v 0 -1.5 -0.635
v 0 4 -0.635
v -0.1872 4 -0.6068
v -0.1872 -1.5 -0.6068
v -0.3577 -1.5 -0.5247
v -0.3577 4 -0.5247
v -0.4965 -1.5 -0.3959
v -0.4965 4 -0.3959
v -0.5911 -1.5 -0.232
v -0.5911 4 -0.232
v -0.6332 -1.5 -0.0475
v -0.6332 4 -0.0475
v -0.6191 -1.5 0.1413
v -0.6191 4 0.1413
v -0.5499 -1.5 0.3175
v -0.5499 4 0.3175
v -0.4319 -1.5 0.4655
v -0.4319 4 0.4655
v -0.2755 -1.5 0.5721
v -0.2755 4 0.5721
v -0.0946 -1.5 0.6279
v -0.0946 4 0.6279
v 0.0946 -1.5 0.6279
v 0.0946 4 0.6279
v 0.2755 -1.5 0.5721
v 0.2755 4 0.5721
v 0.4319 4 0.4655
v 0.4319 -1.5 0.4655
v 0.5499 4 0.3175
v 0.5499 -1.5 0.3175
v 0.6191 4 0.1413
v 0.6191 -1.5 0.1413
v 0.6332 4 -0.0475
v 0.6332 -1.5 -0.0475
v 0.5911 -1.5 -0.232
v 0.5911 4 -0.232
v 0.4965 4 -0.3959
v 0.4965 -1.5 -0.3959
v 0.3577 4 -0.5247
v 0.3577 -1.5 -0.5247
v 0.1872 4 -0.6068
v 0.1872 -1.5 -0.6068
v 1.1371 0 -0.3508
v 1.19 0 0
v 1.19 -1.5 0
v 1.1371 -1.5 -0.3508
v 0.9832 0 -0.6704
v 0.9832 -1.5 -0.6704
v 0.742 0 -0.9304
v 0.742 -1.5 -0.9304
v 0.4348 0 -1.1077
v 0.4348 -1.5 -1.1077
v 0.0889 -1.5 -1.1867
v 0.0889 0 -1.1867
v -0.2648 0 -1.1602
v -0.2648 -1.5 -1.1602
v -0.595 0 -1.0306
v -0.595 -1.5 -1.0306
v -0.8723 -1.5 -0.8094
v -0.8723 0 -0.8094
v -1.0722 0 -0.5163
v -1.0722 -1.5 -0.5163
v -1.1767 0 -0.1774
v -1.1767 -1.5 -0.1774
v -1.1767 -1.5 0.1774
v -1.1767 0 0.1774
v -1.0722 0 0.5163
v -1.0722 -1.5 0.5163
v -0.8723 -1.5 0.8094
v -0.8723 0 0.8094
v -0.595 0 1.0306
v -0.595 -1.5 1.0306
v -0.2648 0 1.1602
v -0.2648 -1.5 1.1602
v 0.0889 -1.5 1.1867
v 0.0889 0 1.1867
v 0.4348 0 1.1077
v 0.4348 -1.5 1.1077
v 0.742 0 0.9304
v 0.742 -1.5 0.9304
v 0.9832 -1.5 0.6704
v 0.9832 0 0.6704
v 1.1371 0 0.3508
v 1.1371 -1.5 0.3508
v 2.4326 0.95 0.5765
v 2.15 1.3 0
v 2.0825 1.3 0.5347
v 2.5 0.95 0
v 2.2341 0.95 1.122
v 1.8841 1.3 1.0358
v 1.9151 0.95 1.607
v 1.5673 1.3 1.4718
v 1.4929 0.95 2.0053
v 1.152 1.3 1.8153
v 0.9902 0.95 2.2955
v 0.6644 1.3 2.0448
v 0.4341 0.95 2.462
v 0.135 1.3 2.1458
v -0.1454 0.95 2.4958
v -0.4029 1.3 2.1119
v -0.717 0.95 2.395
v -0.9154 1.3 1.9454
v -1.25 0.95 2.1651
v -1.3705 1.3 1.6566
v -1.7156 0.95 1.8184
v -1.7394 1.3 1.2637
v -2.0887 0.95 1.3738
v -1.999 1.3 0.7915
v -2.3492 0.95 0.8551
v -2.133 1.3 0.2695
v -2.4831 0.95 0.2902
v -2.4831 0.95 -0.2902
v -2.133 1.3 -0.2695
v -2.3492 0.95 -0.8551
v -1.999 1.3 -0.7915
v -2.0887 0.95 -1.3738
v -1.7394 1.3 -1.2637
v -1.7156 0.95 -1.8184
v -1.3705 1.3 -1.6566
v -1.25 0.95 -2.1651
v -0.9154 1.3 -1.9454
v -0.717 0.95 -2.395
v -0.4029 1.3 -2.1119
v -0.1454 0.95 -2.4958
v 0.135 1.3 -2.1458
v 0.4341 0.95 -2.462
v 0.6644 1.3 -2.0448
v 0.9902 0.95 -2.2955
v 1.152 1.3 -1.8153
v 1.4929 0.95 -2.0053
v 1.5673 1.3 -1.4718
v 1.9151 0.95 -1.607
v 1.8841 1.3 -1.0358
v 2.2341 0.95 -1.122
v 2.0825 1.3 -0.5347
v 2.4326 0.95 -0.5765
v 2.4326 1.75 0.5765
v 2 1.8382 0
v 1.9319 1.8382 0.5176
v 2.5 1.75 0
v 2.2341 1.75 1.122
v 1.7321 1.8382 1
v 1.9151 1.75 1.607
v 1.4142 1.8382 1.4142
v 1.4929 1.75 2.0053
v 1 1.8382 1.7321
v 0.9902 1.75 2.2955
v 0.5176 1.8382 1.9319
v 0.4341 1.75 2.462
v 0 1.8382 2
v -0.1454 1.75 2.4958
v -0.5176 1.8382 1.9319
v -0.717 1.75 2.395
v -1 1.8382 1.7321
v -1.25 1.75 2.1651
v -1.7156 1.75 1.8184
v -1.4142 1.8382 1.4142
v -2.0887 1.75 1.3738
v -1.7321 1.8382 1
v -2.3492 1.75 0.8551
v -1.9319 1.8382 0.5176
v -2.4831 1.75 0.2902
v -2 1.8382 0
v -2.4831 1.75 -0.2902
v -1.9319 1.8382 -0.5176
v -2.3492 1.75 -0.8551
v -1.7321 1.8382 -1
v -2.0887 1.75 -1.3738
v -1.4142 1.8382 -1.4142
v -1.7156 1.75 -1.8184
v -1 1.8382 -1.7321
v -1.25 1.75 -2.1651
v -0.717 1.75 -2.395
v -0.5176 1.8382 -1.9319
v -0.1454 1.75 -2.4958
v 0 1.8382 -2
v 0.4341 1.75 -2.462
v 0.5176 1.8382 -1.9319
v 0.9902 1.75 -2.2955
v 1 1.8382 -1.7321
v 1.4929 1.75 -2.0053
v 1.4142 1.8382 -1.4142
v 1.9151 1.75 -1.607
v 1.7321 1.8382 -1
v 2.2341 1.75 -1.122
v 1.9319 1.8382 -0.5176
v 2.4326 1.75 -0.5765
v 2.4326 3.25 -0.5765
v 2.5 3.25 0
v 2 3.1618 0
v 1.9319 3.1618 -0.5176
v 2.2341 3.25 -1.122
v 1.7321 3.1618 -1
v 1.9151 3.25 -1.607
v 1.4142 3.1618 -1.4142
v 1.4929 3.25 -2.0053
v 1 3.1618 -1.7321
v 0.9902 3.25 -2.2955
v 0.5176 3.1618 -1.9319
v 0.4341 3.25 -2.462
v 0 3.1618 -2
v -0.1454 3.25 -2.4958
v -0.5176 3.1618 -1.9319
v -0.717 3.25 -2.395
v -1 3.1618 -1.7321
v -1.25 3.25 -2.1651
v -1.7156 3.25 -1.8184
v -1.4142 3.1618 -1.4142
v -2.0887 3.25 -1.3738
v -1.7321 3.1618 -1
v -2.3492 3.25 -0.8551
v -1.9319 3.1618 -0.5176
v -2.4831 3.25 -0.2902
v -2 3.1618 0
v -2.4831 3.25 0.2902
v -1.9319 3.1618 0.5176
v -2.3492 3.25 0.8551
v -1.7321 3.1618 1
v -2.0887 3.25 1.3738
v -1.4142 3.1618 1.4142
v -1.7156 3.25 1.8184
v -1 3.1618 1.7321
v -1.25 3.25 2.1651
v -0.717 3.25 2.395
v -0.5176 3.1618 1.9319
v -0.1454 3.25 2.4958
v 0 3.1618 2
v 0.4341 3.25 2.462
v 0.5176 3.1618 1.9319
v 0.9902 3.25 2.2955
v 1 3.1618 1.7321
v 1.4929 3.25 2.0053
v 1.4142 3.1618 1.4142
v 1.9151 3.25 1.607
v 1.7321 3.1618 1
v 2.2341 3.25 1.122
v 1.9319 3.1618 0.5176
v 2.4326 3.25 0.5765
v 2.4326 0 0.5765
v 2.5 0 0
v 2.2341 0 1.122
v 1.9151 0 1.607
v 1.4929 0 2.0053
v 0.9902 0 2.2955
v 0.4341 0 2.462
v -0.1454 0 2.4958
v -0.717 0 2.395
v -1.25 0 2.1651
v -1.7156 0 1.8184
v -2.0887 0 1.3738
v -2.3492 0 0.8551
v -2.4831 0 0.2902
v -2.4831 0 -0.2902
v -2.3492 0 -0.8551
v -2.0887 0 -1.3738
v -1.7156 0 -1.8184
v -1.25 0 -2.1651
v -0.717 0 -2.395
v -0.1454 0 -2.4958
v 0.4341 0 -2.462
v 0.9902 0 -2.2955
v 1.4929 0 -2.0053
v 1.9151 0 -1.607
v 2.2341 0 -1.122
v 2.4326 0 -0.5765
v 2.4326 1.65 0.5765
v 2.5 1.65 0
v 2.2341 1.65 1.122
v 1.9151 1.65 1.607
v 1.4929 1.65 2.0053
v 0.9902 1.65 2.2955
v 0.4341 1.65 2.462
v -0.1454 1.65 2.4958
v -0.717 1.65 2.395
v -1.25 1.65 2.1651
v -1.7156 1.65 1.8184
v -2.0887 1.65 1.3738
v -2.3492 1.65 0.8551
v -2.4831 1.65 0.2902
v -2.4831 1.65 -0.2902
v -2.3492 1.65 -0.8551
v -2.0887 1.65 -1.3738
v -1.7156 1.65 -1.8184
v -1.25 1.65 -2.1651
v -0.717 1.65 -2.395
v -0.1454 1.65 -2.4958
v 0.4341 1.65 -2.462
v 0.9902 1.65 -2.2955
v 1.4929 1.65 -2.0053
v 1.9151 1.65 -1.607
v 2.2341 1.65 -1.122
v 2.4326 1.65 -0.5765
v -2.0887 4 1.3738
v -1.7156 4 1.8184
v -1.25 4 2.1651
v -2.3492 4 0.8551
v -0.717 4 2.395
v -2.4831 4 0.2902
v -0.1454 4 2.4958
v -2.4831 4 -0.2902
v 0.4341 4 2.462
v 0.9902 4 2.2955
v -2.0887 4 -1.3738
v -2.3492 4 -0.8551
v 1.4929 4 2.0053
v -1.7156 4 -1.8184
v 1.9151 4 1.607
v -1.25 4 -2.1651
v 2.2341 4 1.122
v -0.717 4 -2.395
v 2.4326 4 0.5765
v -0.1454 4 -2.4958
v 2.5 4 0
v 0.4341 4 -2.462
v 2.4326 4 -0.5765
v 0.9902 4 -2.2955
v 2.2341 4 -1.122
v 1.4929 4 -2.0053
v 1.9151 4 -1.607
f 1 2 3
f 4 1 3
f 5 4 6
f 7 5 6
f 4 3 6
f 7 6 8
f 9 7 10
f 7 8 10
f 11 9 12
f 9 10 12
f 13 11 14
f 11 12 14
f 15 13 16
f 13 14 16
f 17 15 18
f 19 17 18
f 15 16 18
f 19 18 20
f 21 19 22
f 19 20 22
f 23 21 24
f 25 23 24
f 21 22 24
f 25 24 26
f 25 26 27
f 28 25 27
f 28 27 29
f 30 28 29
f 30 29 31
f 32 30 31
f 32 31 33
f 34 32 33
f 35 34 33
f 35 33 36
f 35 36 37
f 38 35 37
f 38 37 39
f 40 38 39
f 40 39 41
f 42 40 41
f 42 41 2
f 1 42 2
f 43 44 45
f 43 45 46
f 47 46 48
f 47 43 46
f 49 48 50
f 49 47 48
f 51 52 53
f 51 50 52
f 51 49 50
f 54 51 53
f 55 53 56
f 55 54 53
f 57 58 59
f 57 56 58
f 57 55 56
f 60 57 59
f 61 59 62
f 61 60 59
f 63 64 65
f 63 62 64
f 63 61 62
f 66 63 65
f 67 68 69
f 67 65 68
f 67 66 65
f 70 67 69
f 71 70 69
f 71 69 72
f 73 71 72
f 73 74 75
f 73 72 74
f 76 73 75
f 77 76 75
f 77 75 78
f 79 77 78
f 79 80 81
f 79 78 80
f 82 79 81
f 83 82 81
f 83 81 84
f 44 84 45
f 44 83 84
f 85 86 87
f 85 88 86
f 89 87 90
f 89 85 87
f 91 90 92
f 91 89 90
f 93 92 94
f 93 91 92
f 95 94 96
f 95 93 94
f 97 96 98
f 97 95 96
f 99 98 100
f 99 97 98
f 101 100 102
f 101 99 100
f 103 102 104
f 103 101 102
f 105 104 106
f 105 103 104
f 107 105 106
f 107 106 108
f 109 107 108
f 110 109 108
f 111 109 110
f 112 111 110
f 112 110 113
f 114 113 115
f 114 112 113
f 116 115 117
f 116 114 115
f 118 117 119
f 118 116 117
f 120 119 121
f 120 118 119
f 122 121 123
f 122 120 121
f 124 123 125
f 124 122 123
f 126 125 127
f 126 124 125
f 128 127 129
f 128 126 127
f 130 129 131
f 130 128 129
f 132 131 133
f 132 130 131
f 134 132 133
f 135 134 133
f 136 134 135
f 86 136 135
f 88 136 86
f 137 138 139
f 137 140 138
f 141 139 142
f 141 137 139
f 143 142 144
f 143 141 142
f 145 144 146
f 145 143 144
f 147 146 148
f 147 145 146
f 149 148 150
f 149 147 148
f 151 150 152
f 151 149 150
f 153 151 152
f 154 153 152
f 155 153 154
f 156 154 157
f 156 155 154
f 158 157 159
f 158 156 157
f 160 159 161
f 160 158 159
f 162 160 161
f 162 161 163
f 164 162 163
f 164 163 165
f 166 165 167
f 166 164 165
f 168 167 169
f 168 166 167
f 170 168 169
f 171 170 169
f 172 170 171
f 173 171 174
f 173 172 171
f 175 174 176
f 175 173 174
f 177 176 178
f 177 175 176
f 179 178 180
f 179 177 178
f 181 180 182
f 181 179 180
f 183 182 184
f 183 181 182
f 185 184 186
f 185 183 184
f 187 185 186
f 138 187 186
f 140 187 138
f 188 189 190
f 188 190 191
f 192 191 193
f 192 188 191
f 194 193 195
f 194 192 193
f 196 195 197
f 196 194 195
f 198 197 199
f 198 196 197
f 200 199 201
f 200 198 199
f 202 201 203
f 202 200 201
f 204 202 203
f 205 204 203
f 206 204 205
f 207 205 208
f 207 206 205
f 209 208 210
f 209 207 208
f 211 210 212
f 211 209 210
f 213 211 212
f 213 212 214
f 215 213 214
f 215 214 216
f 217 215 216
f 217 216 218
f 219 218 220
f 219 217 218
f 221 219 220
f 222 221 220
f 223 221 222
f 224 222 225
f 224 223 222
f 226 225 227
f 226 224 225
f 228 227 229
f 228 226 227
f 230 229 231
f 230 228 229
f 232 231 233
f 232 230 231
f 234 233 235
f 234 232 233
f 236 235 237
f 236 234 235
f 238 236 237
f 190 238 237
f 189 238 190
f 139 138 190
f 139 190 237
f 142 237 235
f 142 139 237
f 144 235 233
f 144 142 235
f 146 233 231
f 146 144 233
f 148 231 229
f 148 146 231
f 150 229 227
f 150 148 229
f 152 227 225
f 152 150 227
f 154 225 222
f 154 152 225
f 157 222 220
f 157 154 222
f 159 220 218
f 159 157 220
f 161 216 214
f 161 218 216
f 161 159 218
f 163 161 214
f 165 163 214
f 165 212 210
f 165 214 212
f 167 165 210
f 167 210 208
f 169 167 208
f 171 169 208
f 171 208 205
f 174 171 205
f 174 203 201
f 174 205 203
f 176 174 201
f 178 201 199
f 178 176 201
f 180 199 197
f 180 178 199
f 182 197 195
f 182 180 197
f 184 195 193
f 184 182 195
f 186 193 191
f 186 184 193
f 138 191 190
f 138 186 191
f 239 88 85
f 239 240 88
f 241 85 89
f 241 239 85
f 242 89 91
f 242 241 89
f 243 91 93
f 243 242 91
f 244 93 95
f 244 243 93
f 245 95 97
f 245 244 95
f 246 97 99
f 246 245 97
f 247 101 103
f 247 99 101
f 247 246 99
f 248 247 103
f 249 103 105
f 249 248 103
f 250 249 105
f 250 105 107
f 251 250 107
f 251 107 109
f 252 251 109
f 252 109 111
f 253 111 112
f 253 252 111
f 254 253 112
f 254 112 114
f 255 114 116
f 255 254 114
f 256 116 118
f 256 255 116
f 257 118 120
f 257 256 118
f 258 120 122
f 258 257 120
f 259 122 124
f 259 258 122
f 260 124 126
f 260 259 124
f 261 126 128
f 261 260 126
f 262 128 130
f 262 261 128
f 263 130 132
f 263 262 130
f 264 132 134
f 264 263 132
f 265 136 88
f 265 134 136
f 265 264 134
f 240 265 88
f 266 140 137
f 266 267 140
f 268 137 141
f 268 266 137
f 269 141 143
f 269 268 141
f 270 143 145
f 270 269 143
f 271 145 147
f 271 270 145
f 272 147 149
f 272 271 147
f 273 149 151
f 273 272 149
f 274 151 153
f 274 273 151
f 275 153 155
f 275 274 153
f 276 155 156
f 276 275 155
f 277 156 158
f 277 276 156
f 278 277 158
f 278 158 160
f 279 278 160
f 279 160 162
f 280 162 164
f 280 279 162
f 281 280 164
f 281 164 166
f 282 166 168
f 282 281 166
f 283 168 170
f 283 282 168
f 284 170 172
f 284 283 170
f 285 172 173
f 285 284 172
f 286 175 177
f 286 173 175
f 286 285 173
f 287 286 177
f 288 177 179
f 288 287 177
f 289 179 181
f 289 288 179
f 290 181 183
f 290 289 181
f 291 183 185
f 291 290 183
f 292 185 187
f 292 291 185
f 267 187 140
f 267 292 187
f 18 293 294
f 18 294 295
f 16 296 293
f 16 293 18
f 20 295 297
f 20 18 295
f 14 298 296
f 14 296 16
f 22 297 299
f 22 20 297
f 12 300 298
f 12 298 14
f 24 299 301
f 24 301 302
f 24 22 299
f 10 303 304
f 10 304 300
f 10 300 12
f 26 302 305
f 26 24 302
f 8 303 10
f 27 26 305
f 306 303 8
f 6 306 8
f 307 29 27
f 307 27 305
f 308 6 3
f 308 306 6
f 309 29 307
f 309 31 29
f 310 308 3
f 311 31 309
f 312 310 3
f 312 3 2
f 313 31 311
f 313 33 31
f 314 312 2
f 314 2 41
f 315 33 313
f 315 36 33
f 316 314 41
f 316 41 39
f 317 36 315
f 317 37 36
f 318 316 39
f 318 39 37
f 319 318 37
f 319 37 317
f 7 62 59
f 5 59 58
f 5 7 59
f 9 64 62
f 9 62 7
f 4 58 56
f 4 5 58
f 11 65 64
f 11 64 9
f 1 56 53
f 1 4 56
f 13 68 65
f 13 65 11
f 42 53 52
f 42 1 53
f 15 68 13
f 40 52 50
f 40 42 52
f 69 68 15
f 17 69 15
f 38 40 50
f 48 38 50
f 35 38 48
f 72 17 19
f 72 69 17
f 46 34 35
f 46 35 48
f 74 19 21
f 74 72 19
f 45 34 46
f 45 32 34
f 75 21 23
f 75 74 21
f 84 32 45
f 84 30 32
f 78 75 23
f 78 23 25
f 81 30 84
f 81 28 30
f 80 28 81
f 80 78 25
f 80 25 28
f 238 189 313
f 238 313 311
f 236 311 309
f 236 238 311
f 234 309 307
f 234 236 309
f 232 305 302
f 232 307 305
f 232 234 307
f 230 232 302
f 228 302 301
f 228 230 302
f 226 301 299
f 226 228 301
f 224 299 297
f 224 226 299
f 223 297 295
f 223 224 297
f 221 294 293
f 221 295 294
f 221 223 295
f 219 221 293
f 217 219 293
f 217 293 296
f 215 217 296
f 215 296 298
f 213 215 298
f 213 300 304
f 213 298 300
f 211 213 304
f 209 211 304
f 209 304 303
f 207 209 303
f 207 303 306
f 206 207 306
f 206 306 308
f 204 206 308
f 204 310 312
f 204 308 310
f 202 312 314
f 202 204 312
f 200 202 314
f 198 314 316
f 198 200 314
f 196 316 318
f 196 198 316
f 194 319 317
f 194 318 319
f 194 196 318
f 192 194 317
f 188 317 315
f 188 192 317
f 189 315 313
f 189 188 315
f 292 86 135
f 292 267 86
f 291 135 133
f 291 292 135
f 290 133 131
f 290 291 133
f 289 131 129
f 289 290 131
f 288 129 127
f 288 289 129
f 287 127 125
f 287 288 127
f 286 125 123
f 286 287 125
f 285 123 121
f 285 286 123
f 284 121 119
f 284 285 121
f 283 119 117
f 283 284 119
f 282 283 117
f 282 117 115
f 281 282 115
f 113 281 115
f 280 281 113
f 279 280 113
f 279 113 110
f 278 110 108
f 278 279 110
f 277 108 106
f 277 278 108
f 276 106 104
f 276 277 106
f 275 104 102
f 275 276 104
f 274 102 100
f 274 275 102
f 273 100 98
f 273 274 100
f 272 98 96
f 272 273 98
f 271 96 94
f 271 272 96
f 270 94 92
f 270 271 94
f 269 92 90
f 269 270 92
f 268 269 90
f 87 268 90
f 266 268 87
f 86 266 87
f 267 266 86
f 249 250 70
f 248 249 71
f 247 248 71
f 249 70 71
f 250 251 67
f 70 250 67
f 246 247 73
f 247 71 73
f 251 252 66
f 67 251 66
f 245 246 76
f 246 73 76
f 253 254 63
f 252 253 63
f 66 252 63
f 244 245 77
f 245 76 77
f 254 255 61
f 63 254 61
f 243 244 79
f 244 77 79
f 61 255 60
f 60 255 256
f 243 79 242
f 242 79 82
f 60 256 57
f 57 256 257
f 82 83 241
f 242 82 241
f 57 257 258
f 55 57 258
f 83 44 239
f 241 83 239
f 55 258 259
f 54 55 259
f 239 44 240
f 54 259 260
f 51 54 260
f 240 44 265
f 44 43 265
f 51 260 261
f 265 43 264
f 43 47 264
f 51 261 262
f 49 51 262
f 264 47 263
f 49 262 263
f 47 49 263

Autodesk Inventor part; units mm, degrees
ref_plane "YZ Plane" through (0, 0, 0) normal (1, 0, 0) x (0, 1, 0)
ref_plane "XZ Plane" through (0, 0, 0) normal (0, 1, 0) x (-1, 0, 0)
ref_plane "XY Plane" through (0, 0, 0) normal (0, 0, 1) x (1, 0, 0)
sketch "Sketch1" plane through (0, 0, 0) normal (0, 0, 1) x (1, 0, 0)
  line L0 (0, 0) -> (0, 17.163)
  line L1 (2.5, 4) -> (2.5, 3.25)
  line L2 (2.5, 0) -> (0, 0)
  line L3 (2.5, 3.25) -> (2, 3.1618)
  line L4 (2, 3.1618) -> (2, 1.8382)
  line L5 (2, 1.8382) -> (2.5, 1.75)
  line L6 (0, 0) -> (0, 4)
  line L7 (0, 4) -> (2.5, 4)
  line L8 (2.5, 1.65) -> (2.15, 1.3)
  line L9 (2.15, 1.3) -> (2.5, 0.95)
  line L10 (2.5, 1.75) -> (2.5, 1.65)
  line L11 (2.5, 0.95) -> (2.5, 0)
  dimension "d2" = 5
  dimension "d17" = 0.75
  dimension "d18" = 1.75
  dimension "d19" = 100
  dimension "d20" = 100
  dimension "d24" = 1.3237
  dimension "d53" = 1.3
  dimension "d54" = 135
  dimension "d55" = 135
  dimension "d56" = 0.35
revolve "Revolution1" add sketch "Sketch1" angle 360 about axis through (0, 0, 0) along (0, 1, 0)
hole "Hole1" [suppressed]
sketch "Sketch2" plane through (0, 0, 0) normal (0, -1, 0) x (1, 0, 0)
  circle A0 centre (0, 0) radius 1.19
  dimension "d36" = 2.38
extrude "Extrusion1" add sketch "Sketch2" along normal blind 1.5
hole "Hole3" at (0, -1.5, 0) direction (0, 1, 0) diameter 1.27 end through all
properties part number "FOX-ME-126-05" material "CU 110H04"
